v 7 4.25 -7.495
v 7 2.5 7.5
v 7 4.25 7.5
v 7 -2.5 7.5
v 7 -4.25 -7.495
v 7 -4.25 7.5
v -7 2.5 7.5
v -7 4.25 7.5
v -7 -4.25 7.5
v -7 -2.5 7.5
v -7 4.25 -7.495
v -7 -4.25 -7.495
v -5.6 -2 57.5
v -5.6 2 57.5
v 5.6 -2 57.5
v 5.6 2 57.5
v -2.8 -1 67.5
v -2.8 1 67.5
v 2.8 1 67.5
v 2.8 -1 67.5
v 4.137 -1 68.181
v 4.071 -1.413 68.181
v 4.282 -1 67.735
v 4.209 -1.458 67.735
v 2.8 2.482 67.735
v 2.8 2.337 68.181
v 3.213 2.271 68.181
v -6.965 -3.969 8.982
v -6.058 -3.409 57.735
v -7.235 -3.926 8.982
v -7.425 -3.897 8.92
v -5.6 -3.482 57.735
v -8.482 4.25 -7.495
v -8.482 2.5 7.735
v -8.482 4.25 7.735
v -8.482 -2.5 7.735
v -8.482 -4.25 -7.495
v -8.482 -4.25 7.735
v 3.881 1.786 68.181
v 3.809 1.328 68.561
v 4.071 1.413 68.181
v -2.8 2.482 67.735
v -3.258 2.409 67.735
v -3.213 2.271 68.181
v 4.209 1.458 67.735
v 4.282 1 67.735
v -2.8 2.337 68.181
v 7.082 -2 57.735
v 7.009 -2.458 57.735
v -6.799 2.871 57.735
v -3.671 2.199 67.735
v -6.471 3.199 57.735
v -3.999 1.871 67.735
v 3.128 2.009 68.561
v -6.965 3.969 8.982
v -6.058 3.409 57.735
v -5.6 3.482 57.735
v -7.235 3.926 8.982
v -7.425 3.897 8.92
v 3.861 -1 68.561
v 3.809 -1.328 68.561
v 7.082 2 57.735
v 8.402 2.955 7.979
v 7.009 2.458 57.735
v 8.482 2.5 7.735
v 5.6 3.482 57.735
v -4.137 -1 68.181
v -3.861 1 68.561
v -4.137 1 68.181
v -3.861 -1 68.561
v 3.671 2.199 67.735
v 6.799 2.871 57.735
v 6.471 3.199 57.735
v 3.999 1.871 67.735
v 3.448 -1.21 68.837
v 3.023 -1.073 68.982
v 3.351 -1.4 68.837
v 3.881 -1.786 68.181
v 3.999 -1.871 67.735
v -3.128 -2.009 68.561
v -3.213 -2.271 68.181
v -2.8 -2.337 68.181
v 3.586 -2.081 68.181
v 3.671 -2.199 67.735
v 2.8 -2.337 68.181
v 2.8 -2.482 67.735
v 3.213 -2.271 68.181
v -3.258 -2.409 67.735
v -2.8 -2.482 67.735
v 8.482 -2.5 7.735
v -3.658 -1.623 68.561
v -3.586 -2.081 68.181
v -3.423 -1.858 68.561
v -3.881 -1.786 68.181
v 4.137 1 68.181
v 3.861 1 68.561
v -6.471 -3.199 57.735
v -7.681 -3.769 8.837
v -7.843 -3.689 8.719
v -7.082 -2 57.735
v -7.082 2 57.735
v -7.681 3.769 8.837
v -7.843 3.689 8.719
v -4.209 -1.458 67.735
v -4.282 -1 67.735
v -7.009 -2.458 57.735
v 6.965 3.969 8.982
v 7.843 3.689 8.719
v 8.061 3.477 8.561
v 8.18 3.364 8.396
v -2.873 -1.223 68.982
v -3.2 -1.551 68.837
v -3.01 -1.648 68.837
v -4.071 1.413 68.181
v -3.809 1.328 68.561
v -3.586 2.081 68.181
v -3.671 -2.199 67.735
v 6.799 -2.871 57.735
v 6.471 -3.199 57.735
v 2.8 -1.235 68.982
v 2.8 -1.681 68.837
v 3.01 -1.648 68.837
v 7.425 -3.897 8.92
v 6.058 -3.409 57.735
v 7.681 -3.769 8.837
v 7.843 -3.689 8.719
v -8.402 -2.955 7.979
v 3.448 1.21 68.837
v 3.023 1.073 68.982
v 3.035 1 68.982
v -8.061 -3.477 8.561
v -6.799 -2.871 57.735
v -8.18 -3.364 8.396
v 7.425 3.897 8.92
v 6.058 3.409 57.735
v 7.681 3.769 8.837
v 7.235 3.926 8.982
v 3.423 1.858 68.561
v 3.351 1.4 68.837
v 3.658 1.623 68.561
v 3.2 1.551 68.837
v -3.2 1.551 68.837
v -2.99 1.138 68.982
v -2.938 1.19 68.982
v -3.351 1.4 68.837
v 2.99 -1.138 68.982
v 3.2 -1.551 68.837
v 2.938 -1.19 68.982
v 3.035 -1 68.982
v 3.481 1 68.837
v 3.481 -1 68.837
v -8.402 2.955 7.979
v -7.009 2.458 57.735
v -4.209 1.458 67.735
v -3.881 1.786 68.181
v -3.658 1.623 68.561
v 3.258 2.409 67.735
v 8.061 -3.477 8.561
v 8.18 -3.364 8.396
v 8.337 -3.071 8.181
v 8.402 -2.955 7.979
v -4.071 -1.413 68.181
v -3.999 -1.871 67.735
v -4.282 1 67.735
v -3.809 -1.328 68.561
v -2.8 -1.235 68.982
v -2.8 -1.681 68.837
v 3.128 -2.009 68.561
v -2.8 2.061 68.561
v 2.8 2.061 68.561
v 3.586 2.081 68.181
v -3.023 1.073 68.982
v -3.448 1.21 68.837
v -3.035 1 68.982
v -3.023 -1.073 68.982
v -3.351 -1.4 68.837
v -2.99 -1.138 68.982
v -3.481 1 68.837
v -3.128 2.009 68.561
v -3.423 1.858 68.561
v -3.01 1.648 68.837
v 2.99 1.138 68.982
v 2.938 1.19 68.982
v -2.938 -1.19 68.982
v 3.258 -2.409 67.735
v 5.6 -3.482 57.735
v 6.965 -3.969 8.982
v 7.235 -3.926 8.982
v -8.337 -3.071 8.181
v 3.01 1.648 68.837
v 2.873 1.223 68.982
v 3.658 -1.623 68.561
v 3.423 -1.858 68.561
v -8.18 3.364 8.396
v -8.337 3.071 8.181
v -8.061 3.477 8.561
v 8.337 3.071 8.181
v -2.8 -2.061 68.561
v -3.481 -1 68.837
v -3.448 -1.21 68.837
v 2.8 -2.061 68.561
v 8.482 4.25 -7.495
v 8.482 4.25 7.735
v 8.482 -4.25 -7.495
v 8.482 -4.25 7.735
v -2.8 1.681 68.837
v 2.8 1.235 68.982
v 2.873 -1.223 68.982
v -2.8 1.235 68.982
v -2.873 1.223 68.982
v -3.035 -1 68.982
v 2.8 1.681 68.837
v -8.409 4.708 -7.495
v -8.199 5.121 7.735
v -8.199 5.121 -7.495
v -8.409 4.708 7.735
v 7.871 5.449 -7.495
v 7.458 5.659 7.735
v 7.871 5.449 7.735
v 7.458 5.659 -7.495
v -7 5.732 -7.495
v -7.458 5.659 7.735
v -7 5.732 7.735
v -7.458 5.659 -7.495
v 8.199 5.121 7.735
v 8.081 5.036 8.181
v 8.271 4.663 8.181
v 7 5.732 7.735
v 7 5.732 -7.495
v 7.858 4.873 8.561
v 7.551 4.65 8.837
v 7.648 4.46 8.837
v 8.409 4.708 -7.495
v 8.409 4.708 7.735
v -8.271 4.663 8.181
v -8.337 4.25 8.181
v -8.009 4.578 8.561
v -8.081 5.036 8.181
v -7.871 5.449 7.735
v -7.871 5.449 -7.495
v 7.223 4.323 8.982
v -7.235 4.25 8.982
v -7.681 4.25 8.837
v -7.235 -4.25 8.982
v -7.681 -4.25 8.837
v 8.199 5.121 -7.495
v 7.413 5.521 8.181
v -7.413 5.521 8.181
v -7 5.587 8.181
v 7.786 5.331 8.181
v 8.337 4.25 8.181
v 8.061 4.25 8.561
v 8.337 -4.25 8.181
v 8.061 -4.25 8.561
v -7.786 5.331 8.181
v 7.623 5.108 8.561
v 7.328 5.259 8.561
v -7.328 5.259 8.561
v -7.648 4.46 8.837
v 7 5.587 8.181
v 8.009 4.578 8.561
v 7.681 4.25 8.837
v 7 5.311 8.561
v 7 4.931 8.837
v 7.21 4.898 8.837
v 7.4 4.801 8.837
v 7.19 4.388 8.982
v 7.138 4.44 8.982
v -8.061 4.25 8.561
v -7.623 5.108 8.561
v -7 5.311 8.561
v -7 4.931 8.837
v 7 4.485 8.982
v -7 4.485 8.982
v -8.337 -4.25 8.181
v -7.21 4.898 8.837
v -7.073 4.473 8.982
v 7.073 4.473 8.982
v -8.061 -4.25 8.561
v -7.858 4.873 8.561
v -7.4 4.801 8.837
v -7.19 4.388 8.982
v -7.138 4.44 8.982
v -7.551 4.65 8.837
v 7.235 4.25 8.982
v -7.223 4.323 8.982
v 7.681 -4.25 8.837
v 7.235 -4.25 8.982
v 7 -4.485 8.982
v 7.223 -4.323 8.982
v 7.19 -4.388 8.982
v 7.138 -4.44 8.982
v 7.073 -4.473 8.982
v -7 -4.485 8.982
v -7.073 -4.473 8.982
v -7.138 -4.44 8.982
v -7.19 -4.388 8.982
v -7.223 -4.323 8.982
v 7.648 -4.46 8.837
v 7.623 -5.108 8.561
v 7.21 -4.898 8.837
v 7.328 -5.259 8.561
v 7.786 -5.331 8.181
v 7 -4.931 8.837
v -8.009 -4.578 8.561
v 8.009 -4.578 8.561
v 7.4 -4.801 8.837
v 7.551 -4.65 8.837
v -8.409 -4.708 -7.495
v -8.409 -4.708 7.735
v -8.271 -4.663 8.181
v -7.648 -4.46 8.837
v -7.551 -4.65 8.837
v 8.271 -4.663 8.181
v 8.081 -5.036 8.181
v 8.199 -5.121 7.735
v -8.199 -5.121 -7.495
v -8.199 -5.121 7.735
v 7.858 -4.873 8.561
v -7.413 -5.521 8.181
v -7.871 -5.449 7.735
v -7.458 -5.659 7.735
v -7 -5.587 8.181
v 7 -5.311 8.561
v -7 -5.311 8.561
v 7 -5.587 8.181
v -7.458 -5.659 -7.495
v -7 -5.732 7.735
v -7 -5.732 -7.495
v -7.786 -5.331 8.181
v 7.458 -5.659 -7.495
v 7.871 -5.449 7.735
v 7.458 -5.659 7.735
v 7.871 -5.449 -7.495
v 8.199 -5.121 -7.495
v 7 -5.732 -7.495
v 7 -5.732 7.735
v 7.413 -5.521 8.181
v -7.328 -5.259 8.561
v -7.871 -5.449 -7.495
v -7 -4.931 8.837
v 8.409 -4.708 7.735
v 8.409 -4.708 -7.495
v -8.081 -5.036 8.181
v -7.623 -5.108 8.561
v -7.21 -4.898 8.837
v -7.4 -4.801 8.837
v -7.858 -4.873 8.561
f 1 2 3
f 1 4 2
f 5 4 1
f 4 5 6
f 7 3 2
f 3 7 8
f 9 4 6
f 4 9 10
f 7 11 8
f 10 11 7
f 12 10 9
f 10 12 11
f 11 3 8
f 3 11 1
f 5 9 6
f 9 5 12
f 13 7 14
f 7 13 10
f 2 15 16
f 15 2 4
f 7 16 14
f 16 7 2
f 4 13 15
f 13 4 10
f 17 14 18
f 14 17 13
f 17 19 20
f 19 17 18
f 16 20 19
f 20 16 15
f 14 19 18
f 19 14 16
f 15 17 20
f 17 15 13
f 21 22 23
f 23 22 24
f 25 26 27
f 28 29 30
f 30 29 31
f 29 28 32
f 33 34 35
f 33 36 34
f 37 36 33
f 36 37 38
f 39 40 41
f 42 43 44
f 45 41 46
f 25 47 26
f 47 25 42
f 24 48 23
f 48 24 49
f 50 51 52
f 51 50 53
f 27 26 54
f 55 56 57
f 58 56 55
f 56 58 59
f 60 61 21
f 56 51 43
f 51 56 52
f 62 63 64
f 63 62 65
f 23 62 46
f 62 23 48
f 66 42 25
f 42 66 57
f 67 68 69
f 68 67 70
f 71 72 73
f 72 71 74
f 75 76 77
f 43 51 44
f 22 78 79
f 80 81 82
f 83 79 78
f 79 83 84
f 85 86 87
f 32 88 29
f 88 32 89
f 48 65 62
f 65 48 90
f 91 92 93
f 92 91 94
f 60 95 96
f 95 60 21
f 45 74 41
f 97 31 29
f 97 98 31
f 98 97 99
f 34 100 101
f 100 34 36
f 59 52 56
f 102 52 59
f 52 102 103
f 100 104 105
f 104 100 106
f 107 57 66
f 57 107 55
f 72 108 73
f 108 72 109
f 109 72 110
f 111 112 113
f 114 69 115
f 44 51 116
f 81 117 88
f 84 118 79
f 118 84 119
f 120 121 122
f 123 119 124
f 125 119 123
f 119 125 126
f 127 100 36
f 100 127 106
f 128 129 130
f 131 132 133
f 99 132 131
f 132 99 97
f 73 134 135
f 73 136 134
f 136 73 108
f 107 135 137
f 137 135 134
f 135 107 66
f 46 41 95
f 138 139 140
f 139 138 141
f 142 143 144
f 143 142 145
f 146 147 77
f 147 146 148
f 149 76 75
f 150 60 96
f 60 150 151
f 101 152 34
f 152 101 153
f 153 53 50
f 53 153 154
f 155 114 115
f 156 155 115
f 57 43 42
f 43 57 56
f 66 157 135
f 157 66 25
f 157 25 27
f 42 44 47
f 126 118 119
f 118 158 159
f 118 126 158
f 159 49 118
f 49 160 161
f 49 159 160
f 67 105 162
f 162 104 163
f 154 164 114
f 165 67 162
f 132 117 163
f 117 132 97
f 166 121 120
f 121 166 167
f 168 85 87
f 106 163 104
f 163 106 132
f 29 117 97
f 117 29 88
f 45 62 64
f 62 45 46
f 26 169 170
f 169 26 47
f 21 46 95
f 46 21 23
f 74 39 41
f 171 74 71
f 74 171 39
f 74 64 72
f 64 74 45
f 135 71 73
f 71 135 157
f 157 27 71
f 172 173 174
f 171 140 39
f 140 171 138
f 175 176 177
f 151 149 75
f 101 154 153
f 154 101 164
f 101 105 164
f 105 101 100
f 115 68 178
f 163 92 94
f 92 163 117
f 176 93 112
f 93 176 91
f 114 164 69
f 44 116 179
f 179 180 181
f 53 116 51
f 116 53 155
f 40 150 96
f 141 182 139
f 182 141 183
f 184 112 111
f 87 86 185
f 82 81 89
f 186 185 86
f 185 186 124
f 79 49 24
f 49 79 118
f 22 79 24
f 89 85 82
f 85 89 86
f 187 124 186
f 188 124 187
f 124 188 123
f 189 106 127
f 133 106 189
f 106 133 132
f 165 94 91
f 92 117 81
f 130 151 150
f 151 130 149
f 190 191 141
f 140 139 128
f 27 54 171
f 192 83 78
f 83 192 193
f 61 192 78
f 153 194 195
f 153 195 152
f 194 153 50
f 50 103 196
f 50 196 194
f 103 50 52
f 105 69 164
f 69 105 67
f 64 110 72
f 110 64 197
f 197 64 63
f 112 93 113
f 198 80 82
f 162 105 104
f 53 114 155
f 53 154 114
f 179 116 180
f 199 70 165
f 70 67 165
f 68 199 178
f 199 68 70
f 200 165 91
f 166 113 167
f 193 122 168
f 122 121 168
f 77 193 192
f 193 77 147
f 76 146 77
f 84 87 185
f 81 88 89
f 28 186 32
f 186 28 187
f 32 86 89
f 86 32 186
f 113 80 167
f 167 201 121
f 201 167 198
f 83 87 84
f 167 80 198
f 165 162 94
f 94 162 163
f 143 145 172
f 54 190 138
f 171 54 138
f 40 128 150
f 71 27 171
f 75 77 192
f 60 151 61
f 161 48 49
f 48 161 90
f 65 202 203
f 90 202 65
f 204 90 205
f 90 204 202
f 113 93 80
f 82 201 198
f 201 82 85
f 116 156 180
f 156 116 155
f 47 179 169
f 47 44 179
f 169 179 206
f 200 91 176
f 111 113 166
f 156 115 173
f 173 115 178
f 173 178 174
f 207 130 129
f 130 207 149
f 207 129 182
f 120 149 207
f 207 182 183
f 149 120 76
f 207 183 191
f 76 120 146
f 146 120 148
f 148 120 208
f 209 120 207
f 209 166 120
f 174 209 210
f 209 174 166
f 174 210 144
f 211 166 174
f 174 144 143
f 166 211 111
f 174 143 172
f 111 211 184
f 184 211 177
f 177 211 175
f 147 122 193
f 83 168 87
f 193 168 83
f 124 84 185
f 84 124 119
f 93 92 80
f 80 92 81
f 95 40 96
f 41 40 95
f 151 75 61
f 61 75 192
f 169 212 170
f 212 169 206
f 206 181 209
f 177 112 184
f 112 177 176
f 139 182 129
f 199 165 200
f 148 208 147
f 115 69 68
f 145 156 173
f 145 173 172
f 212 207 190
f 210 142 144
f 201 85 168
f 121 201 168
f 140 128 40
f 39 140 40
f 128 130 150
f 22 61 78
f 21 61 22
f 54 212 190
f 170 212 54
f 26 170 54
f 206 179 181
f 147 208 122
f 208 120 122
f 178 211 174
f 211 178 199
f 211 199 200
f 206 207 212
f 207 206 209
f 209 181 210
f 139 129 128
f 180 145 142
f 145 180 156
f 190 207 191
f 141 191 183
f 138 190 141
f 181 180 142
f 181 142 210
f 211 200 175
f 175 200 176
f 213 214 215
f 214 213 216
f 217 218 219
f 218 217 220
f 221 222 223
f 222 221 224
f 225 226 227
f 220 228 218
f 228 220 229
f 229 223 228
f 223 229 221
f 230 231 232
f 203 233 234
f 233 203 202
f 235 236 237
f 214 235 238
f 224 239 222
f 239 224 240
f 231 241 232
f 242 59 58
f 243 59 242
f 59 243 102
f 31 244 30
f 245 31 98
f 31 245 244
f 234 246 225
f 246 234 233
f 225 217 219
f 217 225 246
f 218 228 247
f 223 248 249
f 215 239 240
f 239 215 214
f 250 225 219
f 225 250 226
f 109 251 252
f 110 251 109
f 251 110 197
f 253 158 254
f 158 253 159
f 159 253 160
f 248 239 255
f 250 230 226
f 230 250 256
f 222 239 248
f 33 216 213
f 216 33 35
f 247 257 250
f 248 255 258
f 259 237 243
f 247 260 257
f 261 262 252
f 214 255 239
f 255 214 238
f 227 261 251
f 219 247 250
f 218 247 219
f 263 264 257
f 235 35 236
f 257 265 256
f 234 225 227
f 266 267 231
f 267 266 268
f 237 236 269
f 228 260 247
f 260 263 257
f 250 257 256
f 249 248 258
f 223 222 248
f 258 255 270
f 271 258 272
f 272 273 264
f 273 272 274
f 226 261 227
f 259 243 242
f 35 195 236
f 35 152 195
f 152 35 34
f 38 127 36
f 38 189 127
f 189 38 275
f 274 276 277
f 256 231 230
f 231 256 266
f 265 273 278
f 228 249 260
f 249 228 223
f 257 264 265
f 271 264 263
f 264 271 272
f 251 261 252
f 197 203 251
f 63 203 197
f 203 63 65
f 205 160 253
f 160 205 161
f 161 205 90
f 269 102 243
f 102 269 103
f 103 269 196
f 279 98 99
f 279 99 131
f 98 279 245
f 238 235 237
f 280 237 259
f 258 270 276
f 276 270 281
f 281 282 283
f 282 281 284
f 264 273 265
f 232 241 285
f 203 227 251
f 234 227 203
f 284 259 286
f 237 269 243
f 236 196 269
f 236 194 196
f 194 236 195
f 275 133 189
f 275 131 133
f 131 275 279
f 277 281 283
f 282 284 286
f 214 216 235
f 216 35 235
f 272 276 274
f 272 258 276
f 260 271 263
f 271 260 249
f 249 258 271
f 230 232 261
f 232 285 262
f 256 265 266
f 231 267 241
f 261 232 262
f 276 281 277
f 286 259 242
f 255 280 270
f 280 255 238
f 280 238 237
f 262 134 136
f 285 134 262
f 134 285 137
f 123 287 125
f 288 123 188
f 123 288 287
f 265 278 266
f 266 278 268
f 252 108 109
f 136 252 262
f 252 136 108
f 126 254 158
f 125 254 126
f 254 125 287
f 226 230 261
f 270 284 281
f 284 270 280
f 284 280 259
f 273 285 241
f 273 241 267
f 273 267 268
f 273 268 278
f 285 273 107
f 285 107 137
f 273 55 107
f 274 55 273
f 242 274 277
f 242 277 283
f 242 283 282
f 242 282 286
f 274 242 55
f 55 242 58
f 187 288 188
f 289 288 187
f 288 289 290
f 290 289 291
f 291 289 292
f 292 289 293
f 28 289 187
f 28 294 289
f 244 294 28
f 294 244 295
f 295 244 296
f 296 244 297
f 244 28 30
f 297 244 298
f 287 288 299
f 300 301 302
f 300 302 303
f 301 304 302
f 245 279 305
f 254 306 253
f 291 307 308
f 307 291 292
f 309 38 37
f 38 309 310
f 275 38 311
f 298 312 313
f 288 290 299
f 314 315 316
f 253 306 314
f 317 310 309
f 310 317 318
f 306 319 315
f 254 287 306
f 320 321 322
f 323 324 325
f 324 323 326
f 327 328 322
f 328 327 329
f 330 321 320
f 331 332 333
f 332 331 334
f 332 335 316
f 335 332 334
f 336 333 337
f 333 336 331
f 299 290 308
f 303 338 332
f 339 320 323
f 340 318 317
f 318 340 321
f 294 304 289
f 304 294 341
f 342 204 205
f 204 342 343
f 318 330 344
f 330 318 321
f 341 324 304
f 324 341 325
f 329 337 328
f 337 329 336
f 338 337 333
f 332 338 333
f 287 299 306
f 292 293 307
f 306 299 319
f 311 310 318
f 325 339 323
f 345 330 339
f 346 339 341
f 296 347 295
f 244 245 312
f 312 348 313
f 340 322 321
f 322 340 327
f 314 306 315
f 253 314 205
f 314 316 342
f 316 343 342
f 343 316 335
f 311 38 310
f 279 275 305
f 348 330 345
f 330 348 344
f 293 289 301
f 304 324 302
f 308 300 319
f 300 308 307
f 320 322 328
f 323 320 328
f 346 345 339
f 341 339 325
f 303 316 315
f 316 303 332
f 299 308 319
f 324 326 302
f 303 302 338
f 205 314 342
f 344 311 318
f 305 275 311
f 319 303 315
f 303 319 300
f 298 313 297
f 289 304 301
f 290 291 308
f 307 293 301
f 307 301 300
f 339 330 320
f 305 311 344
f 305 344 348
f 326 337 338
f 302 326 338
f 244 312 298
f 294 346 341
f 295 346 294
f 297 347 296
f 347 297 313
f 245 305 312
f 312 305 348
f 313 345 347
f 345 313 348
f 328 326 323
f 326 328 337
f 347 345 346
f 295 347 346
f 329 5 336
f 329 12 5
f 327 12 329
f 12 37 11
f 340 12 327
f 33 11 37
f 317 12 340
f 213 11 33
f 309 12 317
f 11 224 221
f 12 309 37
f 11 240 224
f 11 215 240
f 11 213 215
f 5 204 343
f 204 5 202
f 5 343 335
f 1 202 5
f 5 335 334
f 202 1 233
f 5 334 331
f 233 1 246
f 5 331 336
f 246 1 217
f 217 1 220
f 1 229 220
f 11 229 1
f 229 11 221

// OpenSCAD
$fn = 20;
thickness = 1.5;

module nuzky() {
	cube([14, 8.5, 15], center=true);
	translate([0, 0, 7.5]) linear_extrude(height=50, scale=0.8) square([14, 5], center=true);
	translate([0, 0, 57.5]) linear_extrude(height=10, scale=0.5) square([14*0.8, 5*0.8], center=true);
}

//nuzky();


difference() {
	minkowski() {
		nuzky();
		sphere(thickness);
	}
	nuzky();
	translate([0, 0, -17.5]) cube([40, 40, 20.01], center=true);
}
